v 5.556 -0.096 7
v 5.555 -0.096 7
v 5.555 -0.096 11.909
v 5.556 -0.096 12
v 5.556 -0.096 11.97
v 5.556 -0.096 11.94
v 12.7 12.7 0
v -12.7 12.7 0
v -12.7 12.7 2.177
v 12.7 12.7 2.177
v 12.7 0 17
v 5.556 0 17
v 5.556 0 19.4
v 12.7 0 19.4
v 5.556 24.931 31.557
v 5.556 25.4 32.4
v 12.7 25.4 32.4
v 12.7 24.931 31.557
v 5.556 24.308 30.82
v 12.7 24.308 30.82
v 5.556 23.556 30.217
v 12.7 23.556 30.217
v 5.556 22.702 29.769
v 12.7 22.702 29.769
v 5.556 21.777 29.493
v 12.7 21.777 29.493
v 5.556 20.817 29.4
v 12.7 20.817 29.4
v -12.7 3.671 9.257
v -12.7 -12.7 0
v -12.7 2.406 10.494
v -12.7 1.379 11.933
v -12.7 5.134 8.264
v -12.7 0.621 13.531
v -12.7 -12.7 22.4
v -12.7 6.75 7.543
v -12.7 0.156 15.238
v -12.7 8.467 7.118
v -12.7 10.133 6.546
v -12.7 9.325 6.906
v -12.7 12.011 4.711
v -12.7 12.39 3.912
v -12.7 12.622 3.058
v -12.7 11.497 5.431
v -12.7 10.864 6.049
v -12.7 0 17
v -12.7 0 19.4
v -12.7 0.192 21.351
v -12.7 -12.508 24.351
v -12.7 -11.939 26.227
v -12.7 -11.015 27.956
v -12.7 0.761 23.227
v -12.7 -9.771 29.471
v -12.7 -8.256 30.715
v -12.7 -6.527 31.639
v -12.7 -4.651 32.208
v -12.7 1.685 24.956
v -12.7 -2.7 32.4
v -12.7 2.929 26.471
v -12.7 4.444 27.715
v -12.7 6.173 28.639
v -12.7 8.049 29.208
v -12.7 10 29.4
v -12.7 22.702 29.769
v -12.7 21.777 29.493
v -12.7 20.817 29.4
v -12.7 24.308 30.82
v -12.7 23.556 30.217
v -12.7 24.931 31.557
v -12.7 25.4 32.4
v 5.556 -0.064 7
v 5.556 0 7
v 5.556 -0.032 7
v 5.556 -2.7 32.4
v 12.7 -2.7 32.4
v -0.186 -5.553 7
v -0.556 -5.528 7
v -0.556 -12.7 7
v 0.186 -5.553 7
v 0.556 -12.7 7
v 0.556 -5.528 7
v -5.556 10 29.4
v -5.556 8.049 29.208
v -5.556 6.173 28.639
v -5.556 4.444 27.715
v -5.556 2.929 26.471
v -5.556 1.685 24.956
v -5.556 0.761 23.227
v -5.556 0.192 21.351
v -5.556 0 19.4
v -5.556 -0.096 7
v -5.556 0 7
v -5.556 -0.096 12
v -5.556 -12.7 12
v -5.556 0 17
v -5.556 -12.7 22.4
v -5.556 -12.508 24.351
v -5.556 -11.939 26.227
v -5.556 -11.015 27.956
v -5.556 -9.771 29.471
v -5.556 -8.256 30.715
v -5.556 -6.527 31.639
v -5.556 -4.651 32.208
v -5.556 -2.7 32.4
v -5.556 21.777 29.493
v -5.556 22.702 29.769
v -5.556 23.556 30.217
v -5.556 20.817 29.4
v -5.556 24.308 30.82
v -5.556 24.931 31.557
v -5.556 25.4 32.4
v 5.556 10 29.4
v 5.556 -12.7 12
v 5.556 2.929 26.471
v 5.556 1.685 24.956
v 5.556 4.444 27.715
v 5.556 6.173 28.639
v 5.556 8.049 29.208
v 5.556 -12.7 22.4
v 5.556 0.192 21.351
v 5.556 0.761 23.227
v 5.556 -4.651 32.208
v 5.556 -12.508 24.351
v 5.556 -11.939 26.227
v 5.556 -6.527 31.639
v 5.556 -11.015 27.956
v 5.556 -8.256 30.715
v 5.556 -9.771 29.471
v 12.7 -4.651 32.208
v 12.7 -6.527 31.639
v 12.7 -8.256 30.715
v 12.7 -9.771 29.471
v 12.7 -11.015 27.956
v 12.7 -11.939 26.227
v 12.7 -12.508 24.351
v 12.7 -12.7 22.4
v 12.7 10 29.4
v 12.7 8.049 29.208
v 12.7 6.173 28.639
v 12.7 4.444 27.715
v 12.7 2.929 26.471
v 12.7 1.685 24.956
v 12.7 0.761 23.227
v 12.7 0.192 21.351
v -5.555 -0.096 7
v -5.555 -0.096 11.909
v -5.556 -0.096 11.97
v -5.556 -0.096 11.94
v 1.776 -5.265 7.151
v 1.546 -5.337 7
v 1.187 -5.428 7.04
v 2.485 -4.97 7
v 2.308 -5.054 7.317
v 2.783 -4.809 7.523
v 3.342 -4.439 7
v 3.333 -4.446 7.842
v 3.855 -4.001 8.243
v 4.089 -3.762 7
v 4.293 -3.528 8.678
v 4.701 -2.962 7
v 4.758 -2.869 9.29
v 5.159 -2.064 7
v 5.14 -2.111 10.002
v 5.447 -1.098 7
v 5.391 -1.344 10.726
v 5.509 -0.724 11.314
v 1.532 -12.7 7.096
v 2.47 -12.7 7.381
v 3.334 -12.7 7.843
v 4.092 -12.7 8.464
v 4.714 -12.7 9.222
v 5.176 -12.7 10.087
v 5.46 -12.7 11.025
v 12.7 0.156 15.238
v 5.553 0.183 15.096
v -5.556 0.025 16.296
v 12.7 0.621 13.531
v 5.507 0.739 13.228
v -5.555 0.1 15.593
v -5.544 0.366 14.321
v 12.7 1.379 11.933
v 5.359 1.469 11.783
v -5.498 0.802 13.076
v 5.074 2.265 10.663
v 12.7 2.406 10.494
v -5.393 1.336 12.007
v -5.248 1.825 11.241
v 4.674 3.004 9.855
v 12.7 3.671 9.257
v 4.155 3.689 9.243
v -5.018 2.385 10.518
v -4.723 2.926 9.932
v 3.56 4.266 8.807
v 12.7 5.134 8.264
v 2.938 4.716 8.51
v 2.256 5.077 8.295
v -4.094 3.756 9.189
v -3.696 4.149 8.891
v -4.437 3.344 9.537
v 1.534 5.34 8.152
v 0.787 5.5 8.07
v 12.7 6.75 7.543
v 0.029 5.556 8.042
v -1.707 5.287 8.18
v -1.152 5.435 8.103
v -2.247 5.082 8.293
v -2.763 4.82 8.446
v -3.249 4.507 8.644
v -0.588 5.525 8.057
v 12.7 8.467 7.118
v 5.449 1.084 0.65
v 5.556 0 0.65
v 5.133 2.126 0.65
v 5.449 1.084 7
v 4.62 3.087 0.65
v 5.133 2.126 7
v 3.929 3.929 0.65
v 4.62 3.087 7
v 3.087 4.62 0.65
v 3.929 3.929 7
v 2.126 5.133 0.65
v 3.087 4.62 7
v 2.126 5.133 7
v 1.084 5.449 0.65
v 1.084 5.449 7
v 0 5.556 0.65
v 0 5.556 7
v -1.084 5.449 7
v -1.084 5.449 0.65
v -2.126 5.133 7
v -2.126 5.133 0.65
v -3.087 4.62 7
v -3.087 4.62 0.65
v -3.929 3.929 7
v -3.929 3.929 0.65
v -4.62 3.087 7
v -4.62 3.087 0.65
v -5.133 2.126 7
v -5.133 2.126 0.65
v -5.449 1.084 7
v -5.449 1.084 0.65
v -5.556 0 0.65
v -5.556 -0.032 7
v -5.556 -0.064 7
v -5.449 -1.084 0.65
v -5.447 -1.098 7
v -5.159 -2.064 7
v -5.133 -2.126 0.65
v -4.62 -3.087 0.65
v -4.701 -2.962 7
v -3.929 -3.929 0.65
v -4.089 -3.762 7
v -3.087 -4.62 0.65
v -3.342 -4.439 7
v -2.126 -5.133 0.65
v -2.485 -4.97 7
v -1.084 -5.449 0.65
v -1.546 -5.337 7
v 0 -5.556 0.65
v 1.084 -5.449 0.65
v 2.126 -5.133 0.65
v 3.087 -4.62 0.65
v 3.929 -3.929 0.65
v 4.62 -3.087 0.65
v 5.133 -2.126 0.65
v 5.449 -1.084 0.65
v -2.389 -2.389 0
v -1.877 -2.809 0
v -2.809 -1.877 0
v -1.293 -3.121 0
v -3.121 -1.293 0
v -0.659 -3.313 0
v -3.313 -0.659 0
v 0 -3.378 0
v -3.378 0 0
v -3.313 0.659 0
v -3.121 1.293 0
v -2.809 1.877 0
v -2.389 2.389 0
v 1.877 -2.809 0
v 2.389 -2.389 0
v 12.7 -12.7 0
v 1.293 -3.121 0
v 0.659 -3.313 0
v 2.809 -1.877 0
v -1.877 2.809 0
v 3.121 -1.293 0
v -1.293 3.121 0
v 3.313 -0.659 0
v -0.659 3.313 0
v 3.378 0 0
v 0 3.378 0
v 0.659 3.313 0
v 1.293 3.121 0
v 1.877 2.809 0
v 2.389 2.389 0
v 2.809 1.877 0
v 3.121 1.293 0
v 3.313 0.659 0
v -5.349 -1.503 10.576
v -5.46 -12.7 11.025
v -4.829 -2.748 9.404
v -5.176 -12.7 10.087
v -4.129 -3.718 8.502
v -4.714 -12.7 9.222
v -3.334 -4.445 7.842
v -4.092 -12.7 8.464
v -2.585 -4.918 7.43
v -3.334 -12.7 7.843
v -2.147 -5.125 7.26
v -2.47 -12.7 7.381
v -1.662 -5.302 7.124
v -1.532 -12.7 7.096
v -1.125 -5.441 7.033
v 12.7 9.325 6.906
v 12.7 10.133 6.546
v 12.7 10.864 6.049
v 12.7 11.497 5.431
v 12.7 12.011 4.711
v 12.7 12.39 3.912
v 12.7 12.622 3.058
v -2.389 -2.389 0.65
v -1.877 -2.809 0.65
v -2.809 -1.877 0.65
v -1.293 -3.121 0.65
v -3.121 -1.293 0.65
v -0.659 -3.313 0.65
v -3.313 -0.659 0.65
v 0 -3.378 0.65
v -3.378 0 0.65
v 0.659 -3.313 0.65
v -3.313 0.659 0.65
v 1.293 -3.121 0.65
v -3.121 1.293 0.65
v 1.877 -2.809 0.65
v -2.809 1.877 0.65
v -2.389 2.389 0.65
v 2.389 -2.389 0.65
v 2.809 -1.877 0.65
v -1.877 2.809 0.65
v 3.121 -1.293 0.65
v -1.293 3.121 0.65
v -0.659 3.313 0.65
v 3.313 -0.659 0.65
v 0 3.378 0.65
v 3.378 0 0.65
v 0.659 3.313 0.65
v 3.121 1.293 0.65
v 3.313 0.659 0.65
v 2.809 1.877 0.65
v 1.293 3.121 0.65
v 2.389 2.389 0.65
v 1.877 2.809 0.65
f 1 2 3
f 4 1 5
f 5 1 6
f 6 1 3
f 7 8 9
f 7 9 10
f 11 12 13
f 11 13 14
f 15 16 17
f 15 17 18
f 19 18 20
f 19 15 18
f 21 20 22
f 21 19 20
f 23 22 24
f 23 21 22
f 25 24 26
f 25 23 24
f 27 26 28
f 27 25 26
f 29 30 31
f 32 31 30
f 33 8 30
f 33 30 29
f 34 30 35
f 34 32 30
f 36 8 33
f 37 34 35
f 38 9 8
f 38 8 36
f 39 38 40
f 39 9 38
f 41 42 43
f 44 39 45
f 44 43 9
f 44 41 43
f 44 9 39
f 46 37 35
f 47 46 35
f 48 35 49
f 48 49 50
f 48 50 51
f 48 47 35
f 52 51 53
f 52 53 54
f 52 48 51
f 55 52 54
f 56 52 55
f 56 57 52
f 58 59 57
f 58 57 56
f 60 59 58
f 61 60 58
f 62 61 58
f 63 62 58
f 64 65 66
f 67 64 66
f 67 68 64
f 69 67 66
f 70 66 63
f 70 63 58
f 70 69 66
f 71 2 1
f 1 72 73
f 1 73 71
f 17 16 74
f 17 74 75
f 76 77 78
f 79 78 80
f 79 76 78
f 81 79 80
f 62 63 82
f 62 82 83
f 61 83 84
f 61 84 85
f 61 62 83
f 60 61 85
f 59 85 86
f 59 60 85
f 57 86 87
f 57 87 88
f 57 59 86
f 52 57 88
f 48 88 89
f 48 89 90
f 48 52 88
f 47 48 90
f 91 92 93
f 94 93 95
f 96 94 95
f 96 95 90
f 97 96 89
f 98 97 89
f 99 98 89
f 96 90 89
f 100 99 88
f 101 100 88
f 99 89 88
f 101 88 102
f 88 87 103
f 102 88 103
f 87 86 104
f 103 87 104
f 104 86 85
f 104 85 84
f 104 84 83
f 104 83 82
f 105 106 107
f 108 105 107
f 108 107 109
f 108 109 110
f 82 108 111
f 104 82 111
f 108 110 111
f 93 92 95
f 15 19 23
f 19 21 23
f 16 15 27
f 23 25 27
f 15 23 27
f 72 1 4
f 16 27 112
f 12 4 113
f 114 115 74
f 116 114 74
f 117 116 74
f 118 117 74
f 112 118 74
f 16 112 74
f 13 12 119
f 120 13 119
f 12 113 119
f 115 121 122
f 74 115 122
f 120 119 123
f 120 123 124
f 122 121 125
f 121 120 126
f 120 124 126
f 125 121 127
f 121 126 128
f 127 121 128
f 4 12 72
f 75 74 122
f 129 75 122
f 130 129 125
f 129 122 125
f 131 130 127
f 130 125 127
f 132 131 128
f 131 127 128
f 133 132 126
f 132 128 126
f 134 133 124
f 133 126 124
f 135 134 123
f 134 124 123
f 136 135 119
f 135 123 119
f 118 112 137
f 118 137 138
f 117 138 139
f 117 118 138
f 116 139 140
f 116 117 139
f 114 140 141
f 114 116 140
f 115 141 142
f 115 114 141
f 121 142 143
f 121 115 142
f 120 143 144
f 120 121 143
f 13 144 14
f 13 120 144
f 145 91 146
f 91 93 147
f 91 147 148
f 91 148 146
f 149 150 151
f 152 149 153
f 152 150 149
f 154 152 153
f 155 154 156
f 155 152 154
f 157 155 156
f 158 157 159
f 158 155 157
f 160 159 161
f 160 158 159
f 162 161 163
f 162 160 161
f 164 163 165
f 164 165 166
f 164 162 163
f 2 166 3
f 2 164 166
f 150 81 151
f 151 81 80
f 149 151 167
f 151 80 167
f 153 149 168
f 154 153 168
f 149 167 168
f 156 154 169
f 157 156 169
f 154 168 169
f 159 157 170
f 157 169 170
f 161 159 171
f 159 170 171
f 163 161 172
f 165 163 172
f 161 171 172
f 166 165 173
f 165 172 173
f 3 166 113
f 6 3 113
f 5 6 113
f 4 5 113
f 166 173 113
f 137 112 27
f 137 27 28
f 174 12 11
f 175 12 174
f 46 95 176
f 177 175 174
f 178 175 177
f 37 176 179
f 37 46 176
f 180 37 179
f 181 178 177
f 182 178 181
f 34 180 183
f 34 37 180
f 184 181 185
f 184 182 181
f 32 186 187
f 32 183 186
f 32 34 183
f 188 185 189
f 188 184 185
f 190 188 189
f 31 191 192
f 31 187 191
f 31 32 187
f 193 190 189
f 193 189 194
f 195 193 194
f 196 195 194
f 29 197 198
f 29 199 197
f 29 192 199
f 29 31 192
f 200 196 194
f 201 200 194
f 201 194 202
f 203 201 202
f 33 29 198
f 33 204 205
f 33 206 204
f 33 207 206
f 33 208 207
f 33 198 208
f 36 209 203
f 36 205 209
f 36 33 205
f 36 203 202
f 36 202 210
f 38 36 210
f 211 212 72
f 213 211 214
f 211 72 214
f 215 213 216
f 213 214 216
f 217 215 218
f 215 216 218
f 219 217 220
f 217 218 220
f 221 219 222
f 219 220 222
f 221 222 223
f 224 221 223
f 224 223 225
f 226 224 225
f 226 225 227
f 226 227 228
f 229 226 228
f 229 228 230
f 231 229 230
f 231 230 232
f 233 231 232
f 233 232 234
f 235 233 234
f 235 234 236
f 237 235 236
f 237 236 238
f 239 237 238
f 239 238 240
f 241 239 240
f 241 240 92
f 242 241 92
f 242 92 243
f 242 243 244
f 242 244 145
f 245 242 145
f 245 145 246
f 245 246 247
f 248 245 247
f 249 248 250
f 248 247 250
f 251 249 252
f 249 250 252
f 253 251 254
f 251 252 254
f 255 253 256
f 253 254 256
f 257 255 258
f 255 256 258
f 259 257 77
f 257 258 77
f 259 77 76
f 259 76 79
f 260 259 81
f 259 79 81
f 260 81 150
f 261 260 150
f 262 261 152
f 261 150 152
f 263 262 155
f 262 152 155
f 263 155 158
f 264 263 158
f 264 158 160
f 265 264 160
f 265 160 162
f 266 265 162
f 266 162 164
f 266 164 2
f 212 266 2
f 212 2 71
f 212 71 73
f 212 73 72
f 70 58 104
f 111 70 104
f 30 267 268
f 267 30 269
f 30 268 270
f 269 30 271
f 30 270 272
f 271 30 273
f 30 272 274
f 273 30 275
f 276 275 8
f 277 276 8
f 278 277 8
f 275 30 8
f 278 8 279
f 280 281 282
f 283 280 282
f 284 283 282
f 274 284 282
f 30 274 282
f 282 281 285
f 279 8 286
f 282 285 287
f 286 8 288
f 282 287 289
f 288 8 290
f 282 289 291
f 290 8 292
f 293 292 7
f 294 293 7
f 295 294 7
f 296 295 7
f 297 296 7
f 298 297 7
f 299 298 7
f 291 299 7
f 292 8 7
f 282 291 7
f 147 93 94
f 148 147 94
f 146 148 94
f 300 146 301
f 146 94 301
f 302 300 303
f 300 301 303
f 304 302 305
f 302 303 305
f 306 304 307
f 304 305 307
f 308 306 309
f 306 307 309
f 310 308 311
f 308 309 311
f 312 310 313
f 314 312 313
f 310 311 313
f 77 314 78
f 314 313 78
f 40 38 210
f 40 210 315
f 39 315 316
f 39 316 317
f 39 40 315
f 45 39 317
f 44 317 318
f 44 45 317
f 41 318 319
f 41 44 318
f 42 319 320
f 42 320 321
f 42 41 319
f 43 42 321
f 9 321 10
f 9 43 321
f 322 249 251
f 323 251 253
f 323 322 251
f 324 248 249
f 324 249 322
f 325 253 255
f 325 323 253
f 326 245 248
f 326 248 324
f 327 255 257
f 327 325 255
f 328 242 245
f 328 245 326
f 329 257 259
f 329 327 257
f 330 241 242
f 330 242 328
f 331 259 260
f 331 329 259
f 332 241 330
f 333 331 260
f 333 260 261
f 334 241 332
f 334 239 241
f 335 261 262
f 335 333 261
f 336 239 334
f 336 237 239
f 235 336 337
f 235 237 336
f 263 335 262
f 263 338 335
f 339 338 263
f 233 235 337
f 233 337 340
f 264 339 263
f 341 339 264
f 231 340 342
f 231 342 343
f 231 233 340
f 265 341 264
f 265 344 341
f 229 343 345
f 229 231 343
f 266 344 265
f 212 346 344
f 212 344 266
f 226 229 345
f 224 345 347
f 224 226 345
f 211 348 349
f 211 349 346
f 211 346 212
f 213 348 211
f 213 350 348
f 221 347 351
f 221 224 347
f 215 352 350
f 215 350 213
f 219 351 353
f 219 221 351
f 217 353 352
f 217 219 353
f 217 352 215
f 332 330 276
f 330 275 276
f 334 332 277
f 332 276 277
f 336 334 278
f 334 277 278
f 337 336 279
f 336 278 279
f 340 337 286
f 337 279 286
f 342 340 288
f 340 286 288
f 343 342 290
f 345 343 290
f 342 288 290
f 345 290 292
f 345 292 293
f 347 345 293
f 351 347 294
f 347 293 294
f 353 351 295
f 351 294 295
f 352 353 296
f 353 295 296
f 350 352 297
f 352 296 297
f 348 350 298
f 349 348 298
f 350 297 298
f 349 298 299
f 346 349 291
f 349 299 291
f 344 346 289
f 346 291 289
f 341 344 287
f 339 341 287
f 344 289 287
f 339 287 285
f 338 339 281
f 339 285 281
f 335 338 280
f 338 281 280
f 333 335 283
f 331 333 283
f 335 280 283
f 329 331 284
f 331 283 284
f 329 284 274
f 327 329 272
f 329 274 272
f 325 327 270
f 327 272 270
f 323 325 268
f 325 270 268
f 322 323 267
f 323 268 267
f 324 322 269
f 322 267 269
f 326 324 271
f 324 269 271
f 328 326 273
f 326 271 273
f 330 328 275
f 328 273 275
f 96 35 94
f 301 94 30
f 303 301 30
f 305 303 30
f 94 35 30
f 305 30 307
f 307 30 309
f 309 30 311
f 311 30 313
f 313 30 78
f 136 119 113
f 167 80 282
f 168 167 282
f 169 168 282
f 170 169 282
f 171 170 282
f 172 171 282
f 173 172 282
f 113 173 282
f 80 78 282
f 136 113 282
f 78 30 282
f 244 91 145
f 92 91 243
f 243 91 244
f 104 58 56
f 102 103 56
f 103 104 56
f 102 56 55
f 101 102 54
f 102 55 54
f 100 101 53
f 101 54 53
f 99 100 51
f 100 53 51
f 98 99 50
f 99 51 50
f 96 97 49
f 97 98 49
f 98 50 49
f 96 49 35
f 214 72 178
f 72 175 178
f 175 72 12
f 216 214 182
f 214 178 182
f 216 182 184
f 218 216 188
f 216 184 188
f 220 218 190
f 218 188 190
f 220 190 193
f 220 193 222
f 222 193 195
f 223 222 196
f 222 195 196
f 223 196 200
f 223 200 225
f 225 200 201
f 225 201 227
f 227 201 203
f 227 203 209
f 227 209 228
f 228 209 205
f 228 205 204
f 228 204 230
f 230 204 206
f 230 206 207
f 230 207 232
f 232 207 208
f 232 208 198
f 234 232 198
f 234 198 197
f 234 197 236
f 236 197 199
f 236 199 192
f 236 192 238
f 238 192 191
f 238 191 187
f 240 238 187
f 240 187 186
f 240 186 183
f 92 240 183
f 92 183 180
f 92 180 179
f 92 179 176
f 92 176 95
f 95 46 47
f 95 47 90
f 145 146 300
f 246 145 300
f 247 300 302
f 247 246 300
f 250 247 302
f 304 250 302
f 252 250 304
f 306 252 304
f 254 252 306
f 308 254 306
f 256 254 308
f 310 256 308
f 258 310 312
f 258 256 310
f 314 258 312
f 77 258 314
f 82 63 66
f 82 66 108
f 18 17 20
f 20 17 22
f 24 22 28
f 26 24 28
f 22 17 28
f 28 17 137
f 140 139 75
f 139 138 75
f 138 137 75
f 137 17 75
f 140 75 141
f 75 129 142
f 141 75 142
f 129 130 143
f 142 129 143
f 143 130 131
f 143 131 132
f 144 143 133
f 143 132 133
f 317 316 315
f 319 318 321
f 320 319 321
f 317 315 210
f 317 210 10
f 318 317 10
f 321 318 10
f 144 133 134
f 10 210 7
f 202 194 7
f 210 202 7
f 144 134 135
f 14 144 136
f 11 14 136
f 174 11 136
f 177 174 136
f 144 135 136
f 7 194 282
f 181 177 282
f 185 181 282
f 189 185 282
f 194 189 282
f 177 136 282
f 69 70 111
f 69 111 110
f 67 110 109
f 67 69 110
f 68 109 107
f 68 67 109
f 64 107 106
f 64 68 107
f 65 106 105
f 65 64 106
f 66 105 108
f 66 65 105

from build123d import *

# Parameters (mm, degrees)
SKETCH1_W                                        = 25.4
SKETCH1_H                                        = 25.4
BOSS_EXTRUDE1_DEPTH                              = 7
CBORE_FOR_1_4_SOCKET_HEAD_CAP_SCREW1_D           = 6.7564
CBORE_FOR_1_4_SOCKET_HEAD_CAP_SCREW1_CBORE_D     = 11.1125
CBORE_FOR_1_4_SOCKET_HEAD_CAP_SCREW1_CBORE_DEPTH = 6.35
SKETCH4_W                                        = 7.14375
SKETCH4_H                                        = 12.7
BOSS_EXTRUDE2_DEPTH                              = 25.4
SKETCH5_W                                        = 7.14375
SKETCH5_H                                        = 3
BOSS_EXTRUDE3_DEPTH                              = 25.4
FILLET1_R                                        = 10
FILLET2_START                                    = -14
FILLET2_DEPTH                                    = 28
FILLET2_START_2                                  = -12.7
FILLET2_2_DEPTH                                  = 12.604348727
FILLET2_START_3                                  = 7
FILLET2_3_DEPTH                                  = 10.0000001


with BuildPart() as part:
    # Sketch1 → Boss-Extrude1 (new body)
    with BuildSketch(Plane.XY):
        Rectangle(SKETCH1_W, SKETCH1_H)
    extrude(amount=BOSS_EXTRUDE1_DEPTH)

    # CBORE for 1/4 Socket Head Cap Screw1 (through all)
    with Locations(Plane.XY.offset(7)):
        with Locations((0, 0)):
            CounterBoreHole(CBORE_FOR_1_4_SOCKET_HEAD_CAP_SCREW1_D / 2, CBORE_FOR_1_4_SOCKET_HEAD_CAP_SCREW1_CBORE_D / 2, CBORE_FOR_1_4_SOCKET_HEAD_CAP_SCREW1_CBORE_DEPTH)

    # Sketch4 → Boss-Extrude2 (add)
    with BuildSketch(Plane.XY.offset(7)):
        with Locations((-9.128125, -6.35)):
            Rectangle(SKETCH4_W, SKETCH4_H)
        with Locations((9.128125, -6.35)):
            Rectangle(SKETCH4_W, SKETCH4_H)
    extrude(amount=BOSS_EXTRUDE2_DEPTH)

    # Sketch5 → Boss-Extrude3 (add)
    with BuildSketch(Plane(origin=(0, 0, 0), x_dir=(1, 0, 0), z_dir=(0, 1, 0))):
        with Locations((-9.128125, -30.9)):
            Rectangle(SKETCH5_W, SKETCH5_H)
        with Locations((9.128125, -30.9)):
            Rectangle(SKETCH5_W, SKETCH5_H)
    extrude(amount=BOSS_EXTRUDE3_DEPTH)

    # Fillet1
    # the kernel refuses this fillet: 10 mm, written as the material it adds along each edge
    with BuildSketch(Plane(origin=(-19.44375, 0, 7), x_dir=(0, 1, 0), z_dir=(1, 0, 0))) as fillet1_piece_1_section:
        with BuildLine():
            CenterArc((FILLET1_R, FILLET1_R), FILLET1_R, 180, 90)
            Line((0, FILLET1_R), (0, 0))
            Line((0, 0), (FILLET1_R, 0))
        make_face()
    fillet1_piece_1 = extrude(amount=32.14375, mode=Mode.PRIVATE)
    fillet1_piece_1 = fillet1_piece_1 - Plane(origin=(0, 0, 7), x_dir=(1, 0, 0), z_dir=(0, 0, 1)) * Cylinder(5.55625, 105, mode=Mode.PRIVATE)
    fillet1_piece_1 = split(fillet1_piece_1, bisect_by=Plane(origin=(-12.7, 0, 7), z_dir=(1, 0, 0)), keep=Keep.TOP, mode=Mode.PRIVATE)
    add(fillet1_piece_1)
    with BuildSketch(Plane(origin=(-12.7, 0, 29.4), x_dir=(0, 0, -1), z_dir=(1, 0, 0))) as fillet1_piece_2:
        with BuildLine():
            CenterArc((FILLET1_R, FILLET1_R), FILLET1_R, 180, 90)
            Line((0, FILLET1_R), (0, 0))
            Line((0, 0), (FILLET1_R, 0))
        make_face()
    extrude(amount=7.14375)
    with BuildSketch(Plane(origin=(-37.7, 0, 29.4), x_dir=(0, 0, -1), z_dir=(1, 0, 0))) as fillet1_piece_3_section:
        with BuildLine():
            CenterArc((FILLET1_R, FILLET1_R), FILLET1_R, 180, 90)
            Line((0, FILLET1_R), (0, 0))
            Line((0, 0), (FILLET1_R, 0))
        make_face()
    fillet1_piece_3 = extrude(amount=57.14375, mode=Mode.PRIVATE)
    fillet1_piece_3 = split(fillet1_piece_3, bisect_by=Plane(origin=(5.55625, 0, 29.4), z_dir=(1, 0, 0)), keep=Keep.TOP, mode=Mode.PRIVATE)
    fillet1_piece_3 = split(fillet1_piece_3, bisect_by=Plane(origin=(12.7, 0, 29.4), z_dir=(-1, 0, 0)), keep=Keep.TOP, mode=Mode.PRIVATE)
    add(fillet1_piece_3)
    with BuildSketch(Plane(origin=(12.7, 0, 29.4), x_dir=(0, 0, -1), z_dir=(-1, 0, 0))) as fillet1_piece_4:
        with BuildLine():
            CenterArc((FILLET1_R, -FILLET1_R), FILLET1_R, 90, 90)
            Line((0, -FILLET1_R), (0, 0))
            Line((0, 0), (FILLET1_R, 0))
        make_face()
    extrude(amount=7.14375)
    with BuildSketch(Plane(origin=(37.7, 0, 29.4), x_dir=(0, 0, -1), z_dir=(-1, 0, 0))) as fillet1_piece_5_section:
        with BuildLine():
            CenterArc((FILLET1_R, -FILLET1_R), FILLET1_R, 90, 90)
            Line((0, -FILLET1_R), (0, 0))
            Line((0, 0), (FILLET1_R, 0))
        make_face()
    fillet1_piece_5 = extrude(amount=57.14375, mode=Mode.PRIVATE)
    fillet1_piece_5 = split(fillet1_piece_5, bisect_by=Plane(origin=(-12.7, 0, 29.4), z_dir=(1, 0, 0)), keep=Keep.TOP, mode=Mode.PRIVATE)
    fillet1_piece_5 = split(fillet1_piece_5, bisect_by=Plane(origin=(-5.55625, 0, 29.4), z_dir=(-1, 0, 0)), keep=Keep.TOP, mode=Mode.PRIVATE)
    add(fillet1_piece_5)
    # the kernel refuses this fillet: 10 mm, written as the material it takes off along each edge
    with BuildSketch(Plane(origin=(-37.7, -12.7, 32.4), x_dir=(0, 0, -1), z_dir=(1, 0, 0))) as fillet1_2_piece_1:
        with BuildLine():
            CenterArc((FILLET1_R, FILLET1_R), FILLET1_R, 180, 90)
            Line((0, FILLET1_R), (0, 0))
            Line((0, 0), (FILLET1_R, 0))
        make_face()
    extrude(amount=57.14375, mode=Mode.SUBTRACT)
    with BuildSketch(Plane(origin=(37.7, -12.7, 32.4), x_dir=(0, 0, -1), z_dir=(-1, 0, 0))) as fillet1_2_piece_2:
        with BuildLine():
            CenterArc((FILLET1_R, -FILLET1_R), FILLET1_R, 90, 90)
            Line((0, -FILLET1_R), (0, 0))
            Line((0, 0), (FILLET1_R, 0))
        make_face()
    extrude(amount=57.14375, mode=Mode.SUBTRACT)

    # Fillet2: read off the stored shape, not the designer's step
    # Fillet2 outline → Fillet2 (cut)
    with BuildSketch(Plane.YZ.offset(FILLET2_START)):
        with BuildLine():
            ThreePointArc((10, 7), (9.231056683, 7.029607521), (8.466666667, 7.118254765))
            ThreePointArc((8.466666667, 7.118254765), (11.496928583, 5.430585697), (12.7, 2.177382148))
            Line((12.7, 2.177382148), (12.7, 7))
            Line((12.7, 7), (10, 7))
        make_face()
        with BuildLine():
            Line((25.4, 29.4), (25.4, 32.4))
            ThreePointArc((25.4, 32.4), (23.556037093, 30.216699867), (20.817424305, 29.4))
            Line((20.817424305, 29.4), (25.4, 29.4))
        make_face()
    extrude(amount=FILLET2_DEPTH, mode=Mode.SUBTRACT)

    # Fillet2 2 outline → Fillet2 2 (add)
    with BuildSketch(Plane(origin=(0, 0, 0), x_dir=(1, 0, 0), z_dir=(0, 1, 0)).offset(FILLET2_START_2)):
        with BuildLine():
            Line((5.55625, -7), (0.55625, -7))
            ThreePointArc((0.55625, -7), (4.091783906, -8.464466094), (5.55625, -12))
            Line((5.55625, -12), (5.55625, -7))
        make_face()
        with BuildLine():
            ThreePointArc((-5.55625, -12), (-4.091783906, -8.464466094), (-0.55625, -7))
            Line((-0.55625, -7), (-5.55625, -7))
            Line((-5.55625, -7), (-5.55625, -12))
        make_face()
    extrude(amount=FILLET2_2_DEPTH)

    # Fillet2 3 outline → Fillet2 3 (cut)
    with BuildSketch(Plane.XY.offset(FILLET2_START_3)):
        with BuildLine():
            ThreePointArc((5.555426617, -0.095651273), (0, 5.55625), (-5.555426617, -0.095651273))
            ThreePointArc((-5.555426617, -0.095651273), (0, -5.55625), (5.555426617, -0.095651273))
        make_face()
    extrude(amount=FILLET2_3_DEPTH, mode=Mode.SUBTRACT)


solid = part.part
